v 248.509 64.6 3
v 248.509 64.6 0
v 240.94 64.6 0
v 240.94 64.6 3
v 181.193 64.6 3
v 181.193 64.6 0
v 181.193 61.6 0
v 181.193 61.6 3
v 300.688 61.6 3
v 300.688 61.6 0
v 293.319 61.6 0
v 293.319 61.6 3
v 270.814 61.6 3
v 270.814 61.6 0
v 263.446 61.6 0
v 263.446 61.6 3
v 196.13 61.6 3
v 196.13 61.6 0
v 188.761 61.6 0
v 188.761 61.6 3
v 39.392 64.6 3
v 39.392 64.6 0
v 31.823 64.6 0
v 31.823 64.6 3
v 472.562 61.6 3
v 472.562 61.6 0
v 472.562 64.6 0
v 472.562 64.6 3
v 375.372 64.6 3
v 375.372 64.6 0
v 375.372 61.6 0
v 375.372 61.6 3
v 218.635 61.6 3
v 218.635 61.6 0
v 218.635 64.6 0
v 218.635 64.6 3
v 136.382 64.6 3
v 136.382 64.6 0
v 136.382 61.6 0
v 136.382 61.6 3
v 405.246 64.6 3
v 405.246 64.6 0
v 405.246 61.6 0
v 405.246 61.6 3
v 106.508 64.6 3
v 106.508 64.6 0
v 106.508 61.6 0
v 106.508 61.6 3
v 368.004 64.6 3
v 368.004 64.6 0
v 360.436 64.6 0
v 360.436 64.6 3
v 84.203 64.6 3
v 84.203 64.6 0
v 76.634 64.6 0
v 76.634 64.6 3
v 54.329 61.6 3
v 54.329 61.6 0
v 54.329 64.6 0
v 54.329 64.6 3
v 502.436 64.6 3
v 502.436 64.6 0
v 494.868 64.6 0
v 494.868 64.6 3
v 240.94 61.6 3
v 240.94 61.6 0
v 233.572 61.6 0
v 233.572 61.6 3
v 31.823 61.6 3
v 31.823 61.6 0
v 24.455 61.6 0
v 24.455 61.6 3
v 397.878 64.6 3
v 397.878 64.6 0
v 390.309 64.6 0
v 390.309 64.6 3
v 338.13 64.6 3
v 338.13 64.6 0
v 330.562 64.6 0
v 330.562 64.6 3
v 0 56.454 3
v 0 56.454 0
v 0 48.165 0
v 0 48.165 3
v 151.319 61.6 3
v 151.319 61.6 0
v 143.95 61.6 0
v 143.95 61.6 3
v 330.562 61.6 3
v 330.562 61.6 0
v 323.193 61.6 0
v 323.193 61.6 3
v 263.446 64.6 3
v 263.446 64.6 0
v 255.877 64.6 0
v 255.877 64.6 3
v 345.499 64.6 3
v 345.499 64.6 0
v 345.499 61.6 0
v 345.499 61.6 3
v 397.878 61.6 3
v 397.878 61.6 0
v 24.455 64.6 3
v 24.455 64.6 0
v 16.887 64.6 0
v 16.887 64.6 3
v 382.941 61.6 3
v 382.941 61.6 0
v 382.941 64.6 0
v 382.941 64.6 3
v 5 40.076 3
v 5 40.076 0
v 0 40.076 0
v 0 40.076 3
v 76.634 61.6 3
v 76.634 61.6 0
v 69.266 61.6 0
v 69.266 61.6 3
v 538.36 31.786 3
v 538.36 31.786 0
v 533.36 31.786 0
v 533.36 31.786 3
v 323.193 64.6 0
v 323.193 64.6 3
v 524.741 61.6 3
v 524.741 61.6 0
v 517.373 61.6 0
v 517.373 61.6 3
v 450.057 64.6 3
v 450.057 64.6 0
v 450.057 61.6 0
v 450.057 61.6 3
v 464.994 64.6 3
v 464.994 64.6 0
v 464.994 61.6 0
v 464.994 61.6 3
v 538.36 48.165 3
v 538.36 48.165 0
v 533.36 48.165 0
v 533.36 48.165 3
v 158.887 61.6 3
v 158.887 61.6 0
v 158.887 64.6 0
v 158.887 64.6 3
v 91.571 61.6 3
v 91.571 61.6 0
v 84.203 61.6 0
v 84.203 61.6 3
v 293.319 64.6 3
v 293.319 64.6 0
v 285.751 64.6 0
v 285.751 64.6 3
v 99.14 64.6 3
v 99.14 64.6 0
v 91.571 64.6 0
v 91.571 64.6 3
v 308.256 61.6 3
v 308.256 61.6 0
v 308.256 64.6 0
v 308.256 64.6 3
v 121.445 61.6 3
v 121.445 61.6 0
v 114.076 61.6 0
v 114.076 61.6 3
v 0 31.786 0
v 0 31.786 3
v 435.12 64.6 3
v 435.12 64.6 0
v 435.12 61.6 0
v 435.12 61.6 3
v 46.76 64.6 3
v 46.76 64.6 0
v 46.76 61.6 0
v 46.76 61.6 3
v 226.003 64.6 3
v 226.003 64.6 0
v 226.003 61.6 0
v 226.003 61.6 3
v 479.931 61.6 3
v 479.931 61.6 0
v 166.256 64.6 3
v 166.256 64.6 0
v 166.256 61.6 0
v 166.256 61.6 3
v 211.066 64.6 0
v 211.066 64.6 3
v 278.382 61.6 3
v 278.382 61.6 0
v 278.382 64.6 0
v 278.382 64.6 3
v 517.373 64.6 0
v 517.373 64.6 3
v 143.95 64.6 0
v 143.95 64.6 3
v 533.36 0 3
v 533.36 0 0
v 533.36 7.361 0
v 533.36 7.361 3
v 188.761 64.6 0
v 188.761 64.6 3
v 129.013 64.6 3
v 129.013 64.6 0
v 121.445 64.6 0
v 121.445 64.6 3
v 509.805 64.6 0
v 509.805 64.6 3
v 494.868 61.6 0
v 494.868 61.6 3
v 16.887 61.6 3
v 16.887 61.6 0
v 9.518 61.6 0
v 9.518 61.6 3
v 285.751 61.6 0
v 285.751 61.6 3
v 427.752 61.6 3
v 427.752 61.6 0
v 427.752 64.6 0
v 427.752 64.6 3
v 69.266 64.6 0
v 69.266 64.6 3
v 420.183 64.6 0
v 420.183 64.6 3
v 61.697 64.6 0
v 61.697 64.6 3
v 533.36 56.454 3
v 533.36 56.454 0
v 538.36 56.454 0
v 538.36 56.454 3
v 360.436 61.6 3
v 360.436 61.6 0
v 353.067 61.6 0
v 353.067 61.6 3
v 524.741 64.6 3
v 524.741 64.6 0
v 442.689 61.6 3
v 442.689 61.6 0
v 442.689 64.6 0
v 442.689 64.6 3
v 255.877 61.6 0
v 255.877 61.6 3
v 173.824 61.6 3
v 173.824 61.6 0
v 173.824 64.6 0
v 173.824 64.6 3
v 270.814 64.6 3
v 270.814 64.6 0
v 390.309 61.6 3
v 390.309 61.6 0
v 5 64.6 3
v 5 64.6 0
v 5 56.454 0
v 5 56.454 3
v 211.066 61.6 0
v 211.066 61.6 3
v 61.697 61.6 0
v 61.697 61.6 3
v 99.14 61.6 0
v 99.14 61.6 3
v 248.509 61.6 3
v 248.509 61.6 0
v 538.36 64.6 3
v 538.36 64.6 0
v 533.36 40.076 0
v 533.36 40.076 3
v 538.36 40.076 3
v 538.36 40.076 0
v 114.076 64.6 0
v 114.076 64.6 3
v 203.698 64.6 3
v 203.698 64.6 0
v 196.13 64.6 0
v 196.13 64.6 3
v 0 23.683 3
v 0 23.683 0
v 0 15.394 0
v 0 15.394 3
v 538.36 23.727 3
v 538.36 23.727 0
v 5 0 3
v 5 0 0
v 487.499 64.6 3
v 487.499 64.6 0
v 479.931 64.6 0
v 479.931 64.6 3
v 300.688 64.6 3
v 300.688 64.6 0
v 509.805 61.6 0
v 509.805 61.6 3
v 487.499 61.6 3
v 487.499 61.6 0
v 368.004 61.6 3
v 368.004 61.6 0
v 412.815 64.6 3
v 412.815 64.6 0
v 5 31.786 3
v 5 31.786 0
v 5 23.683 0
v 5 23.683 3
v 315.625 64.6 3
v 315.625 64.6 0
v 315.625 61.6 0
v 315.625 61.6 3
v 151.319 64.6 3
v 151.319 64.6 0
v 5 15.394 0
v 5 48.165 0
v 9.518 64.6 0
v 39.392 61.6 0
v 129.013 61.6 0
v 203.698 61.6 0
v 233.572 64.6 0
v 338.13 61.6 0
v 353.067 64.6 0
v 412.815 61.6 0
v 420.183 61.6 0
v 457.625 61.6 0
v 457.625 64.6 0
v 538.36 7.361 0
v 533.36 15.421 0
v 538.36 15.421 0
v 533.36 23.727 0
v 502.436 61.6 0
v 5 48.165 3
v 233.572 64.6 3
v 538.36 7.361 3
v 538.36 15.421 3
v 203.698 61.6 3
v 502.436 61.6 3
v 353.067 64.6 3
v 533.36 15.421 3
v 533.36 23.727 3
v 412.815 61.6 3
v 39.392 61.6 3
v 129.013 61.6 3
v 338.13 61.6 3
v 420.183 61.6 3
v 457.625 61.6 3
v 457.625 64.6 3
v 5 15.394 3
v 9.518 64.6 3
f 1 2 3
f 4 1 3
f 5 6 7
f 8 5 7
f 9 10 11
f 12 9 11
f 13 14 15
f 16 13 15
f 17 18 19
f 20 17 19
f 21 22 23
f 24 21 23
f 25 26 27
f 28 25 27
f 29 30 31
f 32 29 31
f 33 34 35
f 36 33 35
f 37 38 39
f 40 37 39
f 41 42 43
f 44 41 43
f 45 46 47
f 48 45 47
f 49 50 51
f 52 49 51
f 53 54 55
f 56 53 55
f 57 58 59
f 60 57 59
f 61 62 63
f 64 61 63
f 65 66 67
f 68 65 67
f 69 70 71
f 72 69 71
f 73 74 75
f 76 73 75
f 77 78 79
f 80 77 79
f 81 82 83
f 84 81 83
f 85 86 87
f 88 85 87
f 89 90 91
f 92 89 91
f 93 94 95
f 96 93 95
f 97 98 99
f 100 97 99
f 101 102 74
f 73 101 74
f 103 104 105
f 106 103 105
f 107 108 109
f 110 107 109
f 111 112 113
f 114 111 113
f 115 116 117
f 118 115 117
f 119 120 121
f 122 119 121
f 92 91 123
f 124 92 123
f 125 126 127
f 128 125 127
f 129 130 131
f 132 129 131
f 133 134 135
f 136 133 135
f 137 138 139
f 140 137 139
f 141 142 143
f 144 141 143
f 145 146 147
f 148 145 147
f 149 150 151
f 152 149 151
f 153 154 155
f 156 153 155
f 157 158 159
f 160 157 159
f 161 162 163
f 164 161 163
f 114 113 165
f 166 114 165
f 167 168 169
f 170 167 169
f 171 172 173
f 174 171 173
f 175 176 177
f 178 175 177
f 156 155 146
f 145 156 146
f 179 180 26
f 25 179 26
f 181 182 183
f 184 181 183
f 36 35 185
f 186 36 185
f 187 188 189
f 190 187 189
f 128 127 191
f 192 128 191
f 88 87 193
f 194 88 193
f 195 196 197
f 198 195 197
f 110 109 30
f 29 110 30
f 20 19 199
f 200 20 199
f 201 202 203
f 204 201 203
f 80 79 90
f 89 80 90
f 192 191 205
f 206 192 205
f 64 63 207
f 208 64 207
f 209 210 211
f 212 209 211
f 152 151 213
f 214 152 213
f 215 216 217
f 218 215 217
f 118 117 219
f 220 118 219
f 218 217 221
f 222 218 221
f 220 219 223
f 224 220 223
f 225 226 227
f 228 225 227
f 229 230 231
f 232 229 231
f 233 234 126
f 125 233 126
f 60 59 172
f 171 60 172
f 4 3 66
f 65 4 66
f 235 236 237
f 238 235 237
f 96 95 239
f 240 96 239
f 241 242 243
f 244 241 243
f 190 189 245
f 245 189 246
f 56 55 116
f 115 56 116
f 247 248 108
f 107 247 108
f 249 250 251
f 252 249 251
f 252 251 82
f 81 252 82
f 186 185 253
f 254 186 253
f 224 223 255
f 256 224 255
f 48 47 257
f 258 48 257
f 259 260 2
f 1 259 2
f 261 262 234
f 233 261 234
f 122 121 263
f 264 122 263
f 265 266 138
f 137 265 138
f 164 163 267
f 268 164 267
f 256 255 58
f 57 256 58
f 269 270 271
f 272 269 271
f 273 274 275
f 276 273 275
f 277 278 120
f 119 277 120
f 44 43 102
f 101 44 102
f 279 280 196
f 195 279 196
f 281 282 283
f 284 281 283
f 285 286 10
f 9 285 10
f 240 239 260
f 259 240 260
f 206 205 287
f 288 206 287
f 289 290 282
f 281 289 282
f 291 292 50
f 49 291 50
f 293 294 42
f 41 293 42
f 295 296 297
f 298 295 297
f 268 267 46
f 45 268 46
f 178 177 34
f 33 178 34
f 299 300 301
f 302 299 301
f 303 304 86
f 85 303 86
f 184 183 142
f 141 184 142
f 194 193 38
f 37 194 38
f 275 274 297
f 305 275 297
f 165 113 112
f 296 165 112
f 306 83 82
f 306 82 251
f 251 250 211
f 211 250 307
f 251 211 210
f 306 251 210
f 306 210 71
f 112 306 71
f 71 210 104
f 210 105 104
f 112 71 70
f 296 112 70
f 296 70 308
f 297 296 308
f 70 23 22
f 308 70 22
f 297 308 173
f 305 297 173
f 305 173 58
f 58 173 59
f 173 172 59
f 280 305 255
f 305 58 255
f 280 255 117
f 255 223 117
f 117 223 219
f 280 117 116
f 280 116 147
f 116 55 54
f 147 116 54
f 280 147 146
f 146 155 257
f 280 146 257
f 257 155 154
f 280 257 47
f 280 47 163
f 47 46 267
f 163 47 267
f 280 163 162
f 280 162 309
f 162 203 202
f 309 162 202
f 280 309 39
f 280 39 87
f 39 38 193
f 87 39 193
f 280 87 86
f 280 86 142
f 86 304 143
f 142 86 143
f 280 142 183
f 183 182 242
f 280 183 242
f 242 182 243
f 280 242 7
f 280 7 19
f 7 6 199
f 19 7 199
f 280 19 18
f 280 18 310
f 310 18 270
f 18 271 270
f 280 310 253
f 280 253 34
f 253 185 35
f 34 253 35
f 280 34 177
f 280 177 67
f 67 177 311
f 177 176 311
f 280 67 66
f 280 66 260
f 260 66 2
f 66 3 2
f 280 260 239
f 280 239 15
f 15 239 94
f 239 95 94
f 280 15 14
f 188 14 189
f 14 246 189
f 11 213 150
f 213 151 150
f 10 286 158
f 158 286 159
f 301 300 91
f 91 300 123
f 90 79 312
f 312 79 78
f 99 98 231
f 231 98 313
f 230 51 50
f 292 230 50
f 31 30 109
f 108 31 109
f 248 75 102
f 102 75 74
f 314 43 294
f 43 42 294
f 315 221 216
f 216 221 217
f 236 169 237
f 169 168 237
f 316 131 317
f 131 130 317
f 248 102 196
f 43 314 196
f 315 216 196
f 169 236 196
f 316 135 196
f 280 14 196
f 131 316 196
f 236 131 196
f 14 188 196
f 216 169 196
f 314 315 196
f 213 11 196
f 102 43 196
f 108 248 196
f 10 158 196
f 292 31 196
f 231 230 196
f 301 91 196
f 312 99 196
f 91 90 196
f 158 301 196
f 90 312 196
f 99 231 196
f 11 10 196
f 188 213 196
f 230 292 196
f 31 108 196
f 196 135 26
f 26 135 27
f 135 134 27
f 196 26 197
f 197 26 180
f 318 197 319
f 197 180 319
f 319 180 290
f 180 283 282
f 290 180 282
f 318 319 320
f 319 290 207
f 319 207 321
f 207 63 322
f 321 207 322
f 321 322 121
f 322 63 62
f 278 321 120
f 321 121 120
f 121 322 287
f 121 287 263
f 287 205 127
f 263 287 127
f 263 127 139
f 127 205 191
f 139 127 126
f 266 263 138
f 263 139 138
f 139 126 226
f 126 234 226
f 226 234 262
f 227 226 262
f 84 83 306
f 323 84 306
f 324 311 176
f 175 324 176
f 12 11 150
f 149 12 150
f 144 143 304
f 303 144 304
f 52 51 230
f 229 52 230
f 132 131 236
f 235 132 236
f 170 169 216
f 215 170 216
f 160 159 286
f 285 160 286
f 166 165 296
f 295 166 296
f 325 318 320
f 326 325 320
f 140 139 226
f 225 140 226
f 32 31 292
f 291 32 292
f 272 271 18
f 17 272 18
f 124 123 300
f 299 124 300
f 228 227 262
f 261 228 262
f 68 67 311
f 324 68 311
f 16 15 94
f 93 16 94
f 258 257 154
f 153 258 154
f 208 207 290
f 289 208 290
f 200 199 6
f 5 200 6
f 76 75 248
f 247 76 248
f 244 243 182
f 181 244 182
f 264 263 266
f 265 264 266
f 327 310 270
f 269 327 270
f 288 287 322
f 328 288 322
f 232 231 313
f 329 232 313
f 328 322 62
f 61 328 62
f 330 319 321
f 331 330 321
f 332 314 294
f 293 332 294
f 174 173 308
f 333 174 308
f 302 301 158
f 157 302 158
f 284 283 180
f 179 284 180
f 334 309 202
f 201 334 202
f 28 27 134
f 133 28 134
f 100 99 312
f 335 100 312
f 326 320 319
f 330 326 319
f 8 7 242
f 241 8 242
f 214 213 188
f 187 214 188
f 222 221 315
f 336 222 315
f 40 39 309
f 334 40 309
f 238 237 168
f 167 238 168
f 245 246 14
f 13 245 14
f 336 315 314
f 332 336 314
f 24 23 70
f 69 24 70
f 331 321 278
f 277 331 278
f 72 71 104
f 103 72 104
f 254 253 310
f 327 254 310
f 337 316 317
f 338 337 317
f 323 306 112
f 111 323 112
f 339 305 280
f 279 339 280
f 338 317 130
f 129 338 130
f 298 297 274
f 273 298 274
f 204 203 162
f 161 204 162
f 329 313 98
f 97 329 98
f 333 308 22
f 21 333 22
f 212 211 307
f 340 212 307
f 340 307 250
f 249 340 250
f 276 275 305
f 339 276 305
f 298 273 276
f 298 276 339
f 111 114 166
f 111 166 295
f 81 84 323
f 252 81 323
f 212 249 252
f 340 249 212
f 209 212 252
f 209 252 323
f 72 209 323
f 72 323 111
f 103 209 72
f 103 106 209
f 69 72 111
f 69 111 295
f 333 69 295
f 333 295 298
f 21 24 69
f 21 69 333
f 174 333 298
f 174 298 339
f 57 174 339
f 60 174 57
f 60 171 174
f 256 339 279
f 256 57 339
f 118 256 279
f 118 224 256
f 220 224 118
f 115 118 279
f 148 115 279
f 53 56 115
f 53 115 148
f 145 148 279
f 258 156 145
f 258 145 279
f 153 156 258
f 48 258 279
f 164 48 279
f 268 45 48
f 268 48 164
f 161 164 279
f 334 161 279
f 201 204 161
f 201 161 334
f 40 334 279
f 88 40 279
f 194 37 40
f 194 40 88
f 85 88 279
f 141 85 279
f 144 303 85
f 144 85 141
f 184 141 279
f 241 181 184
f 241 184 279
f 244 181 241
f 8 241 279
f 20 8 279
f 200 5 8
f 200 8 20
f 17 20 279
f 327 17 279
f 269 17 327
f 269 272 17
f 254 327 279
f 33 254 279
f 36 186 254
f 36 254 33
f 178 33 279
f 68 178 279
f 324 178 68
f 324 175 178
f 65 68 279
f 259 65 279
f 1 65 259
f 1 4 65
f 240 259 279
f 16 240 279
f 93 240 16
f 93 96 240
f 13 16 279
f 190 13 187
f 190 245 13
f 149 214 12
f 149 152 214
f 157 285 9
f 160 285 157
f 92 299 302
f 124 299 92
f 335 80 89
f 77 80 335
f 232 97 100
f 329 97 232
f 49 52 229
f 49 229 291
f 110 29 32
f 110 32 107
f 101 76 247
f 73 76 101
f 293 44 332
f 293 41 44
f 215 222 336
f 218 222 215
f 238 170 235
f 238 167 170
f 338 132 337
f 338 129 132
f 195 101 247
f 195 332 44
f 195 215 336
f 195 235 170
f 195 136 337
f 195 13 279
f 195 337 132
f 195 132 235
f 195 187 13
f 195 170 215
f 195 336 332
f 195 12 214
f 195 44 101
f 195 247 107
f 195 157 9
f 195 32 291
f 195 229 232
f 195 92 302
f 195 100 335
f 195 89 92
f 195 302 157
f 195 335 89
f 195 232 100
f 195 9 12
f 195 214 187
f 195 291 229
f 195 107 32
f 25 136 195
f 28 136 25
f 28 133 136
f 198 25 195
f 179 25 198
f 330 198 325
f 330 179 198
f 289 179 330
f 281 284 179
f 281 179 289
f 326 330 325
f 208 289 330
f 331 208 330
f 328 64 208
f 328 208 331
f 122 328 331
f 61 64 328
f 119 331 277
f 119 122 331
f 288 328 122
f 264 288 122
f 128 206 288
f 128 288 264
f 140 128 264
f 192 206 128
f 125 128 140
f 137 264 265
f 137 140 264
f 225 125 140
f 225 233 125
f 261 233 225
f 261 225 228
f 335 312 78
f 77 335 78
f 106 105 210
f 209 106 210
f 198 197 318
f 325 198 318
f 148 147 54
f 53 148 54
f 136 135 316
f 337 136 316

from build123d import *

# Parameters (mm, degrees)
BOSS_EXTRUDE1_DEPTH = 3


with BuildPart() as part:
    # Sketch1 → Boss-Extrude1 (new body)
    with BuildSketch(Plane.XY):
        Polygon((4.999668, 15.394029), (4.999668, 0), (533.359842, 0), (533.359842, 7.361228), (538.359861, 7.361228), (538.359861, 15.420913), (533.359842, 15.420913), (533.359842, 23.726716), (538.359861, 23.726716), (538.359861, 31.786399), (533.359842, 31.786399), (533.359842, 40.075658), (538.359861, 40.075658), (538.359861, 48.164934), (533.359842, 48.164934), (533.359842, 56.454193), (538.359861, 56.454193), (538.359861, 64.599998), (524.741368, 64.599998), (524.741368, 61.599976), (517.372941, 61.599976), (517.372941, 64.599998), (509.804503, 64.599998), (509.804503, 61.599976), (502.43602, 61.599976), (502.43602, 64.599998), (494.86761, 64.599998), (494.86761, 61.599976), (487.499126, 61.599976), (487.499126, 64.599998), (479.93066, 64.599998), (479.93066, 61.599976), (472.562233, 61.599976), (472.562233, 64.599998), (464.993767, 64.599998), (464.993767, 61.599976), (457.62534, 61.599976), (457.62534, 64.599998), (450.056704, 64.599998), (450.056704, 61.599976), (442.688587, 61.599976), (442.688587, 64.599998), (435.120093, 64.599998), (435.120093, 61.599976), (427.751638, 61.599976), (427.751638, 64.599998), (420.183143, 64.599998), (420.183143, 61.599976), (412.81466, 61.599976), (412.81466, 64.599998), (405.246165, 64.599998), (405.246165, 61.599976), (397.87771, 61.599976), (397.87771, 64.599998), (390.309215, 64.599998), (390.309215, 61.599976), (382.940732, 61.599976), (382.940732, 64.599998), (375.372237, 64.599998), (375.372237, 61.599976), (368.003782, 61.599976), (368.003782, 64.599998), (360.435626, 64.599998), (360.435626, 61.599976), (353.067171, 61.599976), (353.067171, 64.599998), (345.498648, 64.599998), (345.498648, 61.599976), (338.130193, 61.599976), (338.130193, 64.599998), (330.561699, 64.599998), (330.561699, 61.599976), (323.193243, 61.599976), (323.193243, 64.599998), (315.624721, 64.599998), (315.624721, 61.599976), (308.256265, 61.599976), (308.256265, 64.599998), (300.687771, 64.599998), (300.687771, 61.599976), (293.319315, 61.599976), (293.319315, 64.599998), (285.750793, 64.599998), (285.750793, 61.599976), (278.382337, 61.599976), (278.382337, 64.599998), (270.814182, 64.599998), (270.814182, 61.599976), (263.445726, 61.599976), (263.445726, 64.599998), (255.877232, 64.599998), (255.877232, 61.599976), (248.508777, 61.599976), (248.508748, 64.599998), (240.940282, 64.599998), (240.940282, 61.599976), (233.571799, 61.599976), (233.571799, 64.599998), (226.003304, 64.599998), (226.003304, 61.599976), (218.634849, 61.599976), (218.634821, 64.599998), (211.066354, 64.599998), (211.066354, 61.599976), (203.697871, 61.599976), (203.697871, 64.599998), (196.129743, 64.599998), (196.129743, 61.599976), (188.76126, 61.599976), (188.76126, 64.599998), (181.192765, 64.599998), (181.192765, 61.599976), (173.82431, 61.599976), (173.82431, 64.599998), (166.255815, 64.599998), (166.255815, 61.599976), (158.887332, 61.599976), (158.887332, 64.599998), (151.318837, 64.599998), (151.318837, 61.599976), (143.950382, 61.599976), (143.950382, 64.599998), (136.381859, 64.599998), (136.381859, 61.599976), (129.013404, 61.599976), (129.013404, 64.599998), (121.44491, 64.599998), (121.44491, 61.599976), (114.07644, 61.599976), (114.07644, 64.599998), (106.508299, 64.599998), (106.508299, 61.599976), (99.139829, 61.599976), (99.139829, 64.599998), (91.571335, 64.599998), (91.571335, 61.599976), (84.202865, 61.599976), (84.202865, 64.599998), (76.634371, 64.599998), (76.634371, 61.599976), (69.265901, 61.599976), (69.265901, 64.599998), (61.697407, 64.599998), (61.697407, 61.599976), (54.328937, 61.599976), (54.328937, 64.599998), (46.760443, 64.599998), (46.760443, 61.599976), (39.391974, 61.599976), (39.391974, 64.599998), (31.823479, 64.599998), (31.823479, 61.599976), (24.455362, 61.599976), (24.455362, 64.599998), (16.886868, 64.599998), (16.886868, 61.599976), (9.518399, 61.599976), (9.518399, 64.599998), (4.999668, 64.599998), (4.999668, 56.45419), (0, 56.45419), (0, 48.164931), (4.999668, 48.164931), (4.999668, 40.075652), (0, 40.075652), (0, 31.786393), (4.999668, 31.786393), (4.999668, 23.683291), (0, 23.683291), (0, 15.394029), align=None)
    extrude(amount=BOSS_EXTRUDE1_DEPTH)


solid = part.part
